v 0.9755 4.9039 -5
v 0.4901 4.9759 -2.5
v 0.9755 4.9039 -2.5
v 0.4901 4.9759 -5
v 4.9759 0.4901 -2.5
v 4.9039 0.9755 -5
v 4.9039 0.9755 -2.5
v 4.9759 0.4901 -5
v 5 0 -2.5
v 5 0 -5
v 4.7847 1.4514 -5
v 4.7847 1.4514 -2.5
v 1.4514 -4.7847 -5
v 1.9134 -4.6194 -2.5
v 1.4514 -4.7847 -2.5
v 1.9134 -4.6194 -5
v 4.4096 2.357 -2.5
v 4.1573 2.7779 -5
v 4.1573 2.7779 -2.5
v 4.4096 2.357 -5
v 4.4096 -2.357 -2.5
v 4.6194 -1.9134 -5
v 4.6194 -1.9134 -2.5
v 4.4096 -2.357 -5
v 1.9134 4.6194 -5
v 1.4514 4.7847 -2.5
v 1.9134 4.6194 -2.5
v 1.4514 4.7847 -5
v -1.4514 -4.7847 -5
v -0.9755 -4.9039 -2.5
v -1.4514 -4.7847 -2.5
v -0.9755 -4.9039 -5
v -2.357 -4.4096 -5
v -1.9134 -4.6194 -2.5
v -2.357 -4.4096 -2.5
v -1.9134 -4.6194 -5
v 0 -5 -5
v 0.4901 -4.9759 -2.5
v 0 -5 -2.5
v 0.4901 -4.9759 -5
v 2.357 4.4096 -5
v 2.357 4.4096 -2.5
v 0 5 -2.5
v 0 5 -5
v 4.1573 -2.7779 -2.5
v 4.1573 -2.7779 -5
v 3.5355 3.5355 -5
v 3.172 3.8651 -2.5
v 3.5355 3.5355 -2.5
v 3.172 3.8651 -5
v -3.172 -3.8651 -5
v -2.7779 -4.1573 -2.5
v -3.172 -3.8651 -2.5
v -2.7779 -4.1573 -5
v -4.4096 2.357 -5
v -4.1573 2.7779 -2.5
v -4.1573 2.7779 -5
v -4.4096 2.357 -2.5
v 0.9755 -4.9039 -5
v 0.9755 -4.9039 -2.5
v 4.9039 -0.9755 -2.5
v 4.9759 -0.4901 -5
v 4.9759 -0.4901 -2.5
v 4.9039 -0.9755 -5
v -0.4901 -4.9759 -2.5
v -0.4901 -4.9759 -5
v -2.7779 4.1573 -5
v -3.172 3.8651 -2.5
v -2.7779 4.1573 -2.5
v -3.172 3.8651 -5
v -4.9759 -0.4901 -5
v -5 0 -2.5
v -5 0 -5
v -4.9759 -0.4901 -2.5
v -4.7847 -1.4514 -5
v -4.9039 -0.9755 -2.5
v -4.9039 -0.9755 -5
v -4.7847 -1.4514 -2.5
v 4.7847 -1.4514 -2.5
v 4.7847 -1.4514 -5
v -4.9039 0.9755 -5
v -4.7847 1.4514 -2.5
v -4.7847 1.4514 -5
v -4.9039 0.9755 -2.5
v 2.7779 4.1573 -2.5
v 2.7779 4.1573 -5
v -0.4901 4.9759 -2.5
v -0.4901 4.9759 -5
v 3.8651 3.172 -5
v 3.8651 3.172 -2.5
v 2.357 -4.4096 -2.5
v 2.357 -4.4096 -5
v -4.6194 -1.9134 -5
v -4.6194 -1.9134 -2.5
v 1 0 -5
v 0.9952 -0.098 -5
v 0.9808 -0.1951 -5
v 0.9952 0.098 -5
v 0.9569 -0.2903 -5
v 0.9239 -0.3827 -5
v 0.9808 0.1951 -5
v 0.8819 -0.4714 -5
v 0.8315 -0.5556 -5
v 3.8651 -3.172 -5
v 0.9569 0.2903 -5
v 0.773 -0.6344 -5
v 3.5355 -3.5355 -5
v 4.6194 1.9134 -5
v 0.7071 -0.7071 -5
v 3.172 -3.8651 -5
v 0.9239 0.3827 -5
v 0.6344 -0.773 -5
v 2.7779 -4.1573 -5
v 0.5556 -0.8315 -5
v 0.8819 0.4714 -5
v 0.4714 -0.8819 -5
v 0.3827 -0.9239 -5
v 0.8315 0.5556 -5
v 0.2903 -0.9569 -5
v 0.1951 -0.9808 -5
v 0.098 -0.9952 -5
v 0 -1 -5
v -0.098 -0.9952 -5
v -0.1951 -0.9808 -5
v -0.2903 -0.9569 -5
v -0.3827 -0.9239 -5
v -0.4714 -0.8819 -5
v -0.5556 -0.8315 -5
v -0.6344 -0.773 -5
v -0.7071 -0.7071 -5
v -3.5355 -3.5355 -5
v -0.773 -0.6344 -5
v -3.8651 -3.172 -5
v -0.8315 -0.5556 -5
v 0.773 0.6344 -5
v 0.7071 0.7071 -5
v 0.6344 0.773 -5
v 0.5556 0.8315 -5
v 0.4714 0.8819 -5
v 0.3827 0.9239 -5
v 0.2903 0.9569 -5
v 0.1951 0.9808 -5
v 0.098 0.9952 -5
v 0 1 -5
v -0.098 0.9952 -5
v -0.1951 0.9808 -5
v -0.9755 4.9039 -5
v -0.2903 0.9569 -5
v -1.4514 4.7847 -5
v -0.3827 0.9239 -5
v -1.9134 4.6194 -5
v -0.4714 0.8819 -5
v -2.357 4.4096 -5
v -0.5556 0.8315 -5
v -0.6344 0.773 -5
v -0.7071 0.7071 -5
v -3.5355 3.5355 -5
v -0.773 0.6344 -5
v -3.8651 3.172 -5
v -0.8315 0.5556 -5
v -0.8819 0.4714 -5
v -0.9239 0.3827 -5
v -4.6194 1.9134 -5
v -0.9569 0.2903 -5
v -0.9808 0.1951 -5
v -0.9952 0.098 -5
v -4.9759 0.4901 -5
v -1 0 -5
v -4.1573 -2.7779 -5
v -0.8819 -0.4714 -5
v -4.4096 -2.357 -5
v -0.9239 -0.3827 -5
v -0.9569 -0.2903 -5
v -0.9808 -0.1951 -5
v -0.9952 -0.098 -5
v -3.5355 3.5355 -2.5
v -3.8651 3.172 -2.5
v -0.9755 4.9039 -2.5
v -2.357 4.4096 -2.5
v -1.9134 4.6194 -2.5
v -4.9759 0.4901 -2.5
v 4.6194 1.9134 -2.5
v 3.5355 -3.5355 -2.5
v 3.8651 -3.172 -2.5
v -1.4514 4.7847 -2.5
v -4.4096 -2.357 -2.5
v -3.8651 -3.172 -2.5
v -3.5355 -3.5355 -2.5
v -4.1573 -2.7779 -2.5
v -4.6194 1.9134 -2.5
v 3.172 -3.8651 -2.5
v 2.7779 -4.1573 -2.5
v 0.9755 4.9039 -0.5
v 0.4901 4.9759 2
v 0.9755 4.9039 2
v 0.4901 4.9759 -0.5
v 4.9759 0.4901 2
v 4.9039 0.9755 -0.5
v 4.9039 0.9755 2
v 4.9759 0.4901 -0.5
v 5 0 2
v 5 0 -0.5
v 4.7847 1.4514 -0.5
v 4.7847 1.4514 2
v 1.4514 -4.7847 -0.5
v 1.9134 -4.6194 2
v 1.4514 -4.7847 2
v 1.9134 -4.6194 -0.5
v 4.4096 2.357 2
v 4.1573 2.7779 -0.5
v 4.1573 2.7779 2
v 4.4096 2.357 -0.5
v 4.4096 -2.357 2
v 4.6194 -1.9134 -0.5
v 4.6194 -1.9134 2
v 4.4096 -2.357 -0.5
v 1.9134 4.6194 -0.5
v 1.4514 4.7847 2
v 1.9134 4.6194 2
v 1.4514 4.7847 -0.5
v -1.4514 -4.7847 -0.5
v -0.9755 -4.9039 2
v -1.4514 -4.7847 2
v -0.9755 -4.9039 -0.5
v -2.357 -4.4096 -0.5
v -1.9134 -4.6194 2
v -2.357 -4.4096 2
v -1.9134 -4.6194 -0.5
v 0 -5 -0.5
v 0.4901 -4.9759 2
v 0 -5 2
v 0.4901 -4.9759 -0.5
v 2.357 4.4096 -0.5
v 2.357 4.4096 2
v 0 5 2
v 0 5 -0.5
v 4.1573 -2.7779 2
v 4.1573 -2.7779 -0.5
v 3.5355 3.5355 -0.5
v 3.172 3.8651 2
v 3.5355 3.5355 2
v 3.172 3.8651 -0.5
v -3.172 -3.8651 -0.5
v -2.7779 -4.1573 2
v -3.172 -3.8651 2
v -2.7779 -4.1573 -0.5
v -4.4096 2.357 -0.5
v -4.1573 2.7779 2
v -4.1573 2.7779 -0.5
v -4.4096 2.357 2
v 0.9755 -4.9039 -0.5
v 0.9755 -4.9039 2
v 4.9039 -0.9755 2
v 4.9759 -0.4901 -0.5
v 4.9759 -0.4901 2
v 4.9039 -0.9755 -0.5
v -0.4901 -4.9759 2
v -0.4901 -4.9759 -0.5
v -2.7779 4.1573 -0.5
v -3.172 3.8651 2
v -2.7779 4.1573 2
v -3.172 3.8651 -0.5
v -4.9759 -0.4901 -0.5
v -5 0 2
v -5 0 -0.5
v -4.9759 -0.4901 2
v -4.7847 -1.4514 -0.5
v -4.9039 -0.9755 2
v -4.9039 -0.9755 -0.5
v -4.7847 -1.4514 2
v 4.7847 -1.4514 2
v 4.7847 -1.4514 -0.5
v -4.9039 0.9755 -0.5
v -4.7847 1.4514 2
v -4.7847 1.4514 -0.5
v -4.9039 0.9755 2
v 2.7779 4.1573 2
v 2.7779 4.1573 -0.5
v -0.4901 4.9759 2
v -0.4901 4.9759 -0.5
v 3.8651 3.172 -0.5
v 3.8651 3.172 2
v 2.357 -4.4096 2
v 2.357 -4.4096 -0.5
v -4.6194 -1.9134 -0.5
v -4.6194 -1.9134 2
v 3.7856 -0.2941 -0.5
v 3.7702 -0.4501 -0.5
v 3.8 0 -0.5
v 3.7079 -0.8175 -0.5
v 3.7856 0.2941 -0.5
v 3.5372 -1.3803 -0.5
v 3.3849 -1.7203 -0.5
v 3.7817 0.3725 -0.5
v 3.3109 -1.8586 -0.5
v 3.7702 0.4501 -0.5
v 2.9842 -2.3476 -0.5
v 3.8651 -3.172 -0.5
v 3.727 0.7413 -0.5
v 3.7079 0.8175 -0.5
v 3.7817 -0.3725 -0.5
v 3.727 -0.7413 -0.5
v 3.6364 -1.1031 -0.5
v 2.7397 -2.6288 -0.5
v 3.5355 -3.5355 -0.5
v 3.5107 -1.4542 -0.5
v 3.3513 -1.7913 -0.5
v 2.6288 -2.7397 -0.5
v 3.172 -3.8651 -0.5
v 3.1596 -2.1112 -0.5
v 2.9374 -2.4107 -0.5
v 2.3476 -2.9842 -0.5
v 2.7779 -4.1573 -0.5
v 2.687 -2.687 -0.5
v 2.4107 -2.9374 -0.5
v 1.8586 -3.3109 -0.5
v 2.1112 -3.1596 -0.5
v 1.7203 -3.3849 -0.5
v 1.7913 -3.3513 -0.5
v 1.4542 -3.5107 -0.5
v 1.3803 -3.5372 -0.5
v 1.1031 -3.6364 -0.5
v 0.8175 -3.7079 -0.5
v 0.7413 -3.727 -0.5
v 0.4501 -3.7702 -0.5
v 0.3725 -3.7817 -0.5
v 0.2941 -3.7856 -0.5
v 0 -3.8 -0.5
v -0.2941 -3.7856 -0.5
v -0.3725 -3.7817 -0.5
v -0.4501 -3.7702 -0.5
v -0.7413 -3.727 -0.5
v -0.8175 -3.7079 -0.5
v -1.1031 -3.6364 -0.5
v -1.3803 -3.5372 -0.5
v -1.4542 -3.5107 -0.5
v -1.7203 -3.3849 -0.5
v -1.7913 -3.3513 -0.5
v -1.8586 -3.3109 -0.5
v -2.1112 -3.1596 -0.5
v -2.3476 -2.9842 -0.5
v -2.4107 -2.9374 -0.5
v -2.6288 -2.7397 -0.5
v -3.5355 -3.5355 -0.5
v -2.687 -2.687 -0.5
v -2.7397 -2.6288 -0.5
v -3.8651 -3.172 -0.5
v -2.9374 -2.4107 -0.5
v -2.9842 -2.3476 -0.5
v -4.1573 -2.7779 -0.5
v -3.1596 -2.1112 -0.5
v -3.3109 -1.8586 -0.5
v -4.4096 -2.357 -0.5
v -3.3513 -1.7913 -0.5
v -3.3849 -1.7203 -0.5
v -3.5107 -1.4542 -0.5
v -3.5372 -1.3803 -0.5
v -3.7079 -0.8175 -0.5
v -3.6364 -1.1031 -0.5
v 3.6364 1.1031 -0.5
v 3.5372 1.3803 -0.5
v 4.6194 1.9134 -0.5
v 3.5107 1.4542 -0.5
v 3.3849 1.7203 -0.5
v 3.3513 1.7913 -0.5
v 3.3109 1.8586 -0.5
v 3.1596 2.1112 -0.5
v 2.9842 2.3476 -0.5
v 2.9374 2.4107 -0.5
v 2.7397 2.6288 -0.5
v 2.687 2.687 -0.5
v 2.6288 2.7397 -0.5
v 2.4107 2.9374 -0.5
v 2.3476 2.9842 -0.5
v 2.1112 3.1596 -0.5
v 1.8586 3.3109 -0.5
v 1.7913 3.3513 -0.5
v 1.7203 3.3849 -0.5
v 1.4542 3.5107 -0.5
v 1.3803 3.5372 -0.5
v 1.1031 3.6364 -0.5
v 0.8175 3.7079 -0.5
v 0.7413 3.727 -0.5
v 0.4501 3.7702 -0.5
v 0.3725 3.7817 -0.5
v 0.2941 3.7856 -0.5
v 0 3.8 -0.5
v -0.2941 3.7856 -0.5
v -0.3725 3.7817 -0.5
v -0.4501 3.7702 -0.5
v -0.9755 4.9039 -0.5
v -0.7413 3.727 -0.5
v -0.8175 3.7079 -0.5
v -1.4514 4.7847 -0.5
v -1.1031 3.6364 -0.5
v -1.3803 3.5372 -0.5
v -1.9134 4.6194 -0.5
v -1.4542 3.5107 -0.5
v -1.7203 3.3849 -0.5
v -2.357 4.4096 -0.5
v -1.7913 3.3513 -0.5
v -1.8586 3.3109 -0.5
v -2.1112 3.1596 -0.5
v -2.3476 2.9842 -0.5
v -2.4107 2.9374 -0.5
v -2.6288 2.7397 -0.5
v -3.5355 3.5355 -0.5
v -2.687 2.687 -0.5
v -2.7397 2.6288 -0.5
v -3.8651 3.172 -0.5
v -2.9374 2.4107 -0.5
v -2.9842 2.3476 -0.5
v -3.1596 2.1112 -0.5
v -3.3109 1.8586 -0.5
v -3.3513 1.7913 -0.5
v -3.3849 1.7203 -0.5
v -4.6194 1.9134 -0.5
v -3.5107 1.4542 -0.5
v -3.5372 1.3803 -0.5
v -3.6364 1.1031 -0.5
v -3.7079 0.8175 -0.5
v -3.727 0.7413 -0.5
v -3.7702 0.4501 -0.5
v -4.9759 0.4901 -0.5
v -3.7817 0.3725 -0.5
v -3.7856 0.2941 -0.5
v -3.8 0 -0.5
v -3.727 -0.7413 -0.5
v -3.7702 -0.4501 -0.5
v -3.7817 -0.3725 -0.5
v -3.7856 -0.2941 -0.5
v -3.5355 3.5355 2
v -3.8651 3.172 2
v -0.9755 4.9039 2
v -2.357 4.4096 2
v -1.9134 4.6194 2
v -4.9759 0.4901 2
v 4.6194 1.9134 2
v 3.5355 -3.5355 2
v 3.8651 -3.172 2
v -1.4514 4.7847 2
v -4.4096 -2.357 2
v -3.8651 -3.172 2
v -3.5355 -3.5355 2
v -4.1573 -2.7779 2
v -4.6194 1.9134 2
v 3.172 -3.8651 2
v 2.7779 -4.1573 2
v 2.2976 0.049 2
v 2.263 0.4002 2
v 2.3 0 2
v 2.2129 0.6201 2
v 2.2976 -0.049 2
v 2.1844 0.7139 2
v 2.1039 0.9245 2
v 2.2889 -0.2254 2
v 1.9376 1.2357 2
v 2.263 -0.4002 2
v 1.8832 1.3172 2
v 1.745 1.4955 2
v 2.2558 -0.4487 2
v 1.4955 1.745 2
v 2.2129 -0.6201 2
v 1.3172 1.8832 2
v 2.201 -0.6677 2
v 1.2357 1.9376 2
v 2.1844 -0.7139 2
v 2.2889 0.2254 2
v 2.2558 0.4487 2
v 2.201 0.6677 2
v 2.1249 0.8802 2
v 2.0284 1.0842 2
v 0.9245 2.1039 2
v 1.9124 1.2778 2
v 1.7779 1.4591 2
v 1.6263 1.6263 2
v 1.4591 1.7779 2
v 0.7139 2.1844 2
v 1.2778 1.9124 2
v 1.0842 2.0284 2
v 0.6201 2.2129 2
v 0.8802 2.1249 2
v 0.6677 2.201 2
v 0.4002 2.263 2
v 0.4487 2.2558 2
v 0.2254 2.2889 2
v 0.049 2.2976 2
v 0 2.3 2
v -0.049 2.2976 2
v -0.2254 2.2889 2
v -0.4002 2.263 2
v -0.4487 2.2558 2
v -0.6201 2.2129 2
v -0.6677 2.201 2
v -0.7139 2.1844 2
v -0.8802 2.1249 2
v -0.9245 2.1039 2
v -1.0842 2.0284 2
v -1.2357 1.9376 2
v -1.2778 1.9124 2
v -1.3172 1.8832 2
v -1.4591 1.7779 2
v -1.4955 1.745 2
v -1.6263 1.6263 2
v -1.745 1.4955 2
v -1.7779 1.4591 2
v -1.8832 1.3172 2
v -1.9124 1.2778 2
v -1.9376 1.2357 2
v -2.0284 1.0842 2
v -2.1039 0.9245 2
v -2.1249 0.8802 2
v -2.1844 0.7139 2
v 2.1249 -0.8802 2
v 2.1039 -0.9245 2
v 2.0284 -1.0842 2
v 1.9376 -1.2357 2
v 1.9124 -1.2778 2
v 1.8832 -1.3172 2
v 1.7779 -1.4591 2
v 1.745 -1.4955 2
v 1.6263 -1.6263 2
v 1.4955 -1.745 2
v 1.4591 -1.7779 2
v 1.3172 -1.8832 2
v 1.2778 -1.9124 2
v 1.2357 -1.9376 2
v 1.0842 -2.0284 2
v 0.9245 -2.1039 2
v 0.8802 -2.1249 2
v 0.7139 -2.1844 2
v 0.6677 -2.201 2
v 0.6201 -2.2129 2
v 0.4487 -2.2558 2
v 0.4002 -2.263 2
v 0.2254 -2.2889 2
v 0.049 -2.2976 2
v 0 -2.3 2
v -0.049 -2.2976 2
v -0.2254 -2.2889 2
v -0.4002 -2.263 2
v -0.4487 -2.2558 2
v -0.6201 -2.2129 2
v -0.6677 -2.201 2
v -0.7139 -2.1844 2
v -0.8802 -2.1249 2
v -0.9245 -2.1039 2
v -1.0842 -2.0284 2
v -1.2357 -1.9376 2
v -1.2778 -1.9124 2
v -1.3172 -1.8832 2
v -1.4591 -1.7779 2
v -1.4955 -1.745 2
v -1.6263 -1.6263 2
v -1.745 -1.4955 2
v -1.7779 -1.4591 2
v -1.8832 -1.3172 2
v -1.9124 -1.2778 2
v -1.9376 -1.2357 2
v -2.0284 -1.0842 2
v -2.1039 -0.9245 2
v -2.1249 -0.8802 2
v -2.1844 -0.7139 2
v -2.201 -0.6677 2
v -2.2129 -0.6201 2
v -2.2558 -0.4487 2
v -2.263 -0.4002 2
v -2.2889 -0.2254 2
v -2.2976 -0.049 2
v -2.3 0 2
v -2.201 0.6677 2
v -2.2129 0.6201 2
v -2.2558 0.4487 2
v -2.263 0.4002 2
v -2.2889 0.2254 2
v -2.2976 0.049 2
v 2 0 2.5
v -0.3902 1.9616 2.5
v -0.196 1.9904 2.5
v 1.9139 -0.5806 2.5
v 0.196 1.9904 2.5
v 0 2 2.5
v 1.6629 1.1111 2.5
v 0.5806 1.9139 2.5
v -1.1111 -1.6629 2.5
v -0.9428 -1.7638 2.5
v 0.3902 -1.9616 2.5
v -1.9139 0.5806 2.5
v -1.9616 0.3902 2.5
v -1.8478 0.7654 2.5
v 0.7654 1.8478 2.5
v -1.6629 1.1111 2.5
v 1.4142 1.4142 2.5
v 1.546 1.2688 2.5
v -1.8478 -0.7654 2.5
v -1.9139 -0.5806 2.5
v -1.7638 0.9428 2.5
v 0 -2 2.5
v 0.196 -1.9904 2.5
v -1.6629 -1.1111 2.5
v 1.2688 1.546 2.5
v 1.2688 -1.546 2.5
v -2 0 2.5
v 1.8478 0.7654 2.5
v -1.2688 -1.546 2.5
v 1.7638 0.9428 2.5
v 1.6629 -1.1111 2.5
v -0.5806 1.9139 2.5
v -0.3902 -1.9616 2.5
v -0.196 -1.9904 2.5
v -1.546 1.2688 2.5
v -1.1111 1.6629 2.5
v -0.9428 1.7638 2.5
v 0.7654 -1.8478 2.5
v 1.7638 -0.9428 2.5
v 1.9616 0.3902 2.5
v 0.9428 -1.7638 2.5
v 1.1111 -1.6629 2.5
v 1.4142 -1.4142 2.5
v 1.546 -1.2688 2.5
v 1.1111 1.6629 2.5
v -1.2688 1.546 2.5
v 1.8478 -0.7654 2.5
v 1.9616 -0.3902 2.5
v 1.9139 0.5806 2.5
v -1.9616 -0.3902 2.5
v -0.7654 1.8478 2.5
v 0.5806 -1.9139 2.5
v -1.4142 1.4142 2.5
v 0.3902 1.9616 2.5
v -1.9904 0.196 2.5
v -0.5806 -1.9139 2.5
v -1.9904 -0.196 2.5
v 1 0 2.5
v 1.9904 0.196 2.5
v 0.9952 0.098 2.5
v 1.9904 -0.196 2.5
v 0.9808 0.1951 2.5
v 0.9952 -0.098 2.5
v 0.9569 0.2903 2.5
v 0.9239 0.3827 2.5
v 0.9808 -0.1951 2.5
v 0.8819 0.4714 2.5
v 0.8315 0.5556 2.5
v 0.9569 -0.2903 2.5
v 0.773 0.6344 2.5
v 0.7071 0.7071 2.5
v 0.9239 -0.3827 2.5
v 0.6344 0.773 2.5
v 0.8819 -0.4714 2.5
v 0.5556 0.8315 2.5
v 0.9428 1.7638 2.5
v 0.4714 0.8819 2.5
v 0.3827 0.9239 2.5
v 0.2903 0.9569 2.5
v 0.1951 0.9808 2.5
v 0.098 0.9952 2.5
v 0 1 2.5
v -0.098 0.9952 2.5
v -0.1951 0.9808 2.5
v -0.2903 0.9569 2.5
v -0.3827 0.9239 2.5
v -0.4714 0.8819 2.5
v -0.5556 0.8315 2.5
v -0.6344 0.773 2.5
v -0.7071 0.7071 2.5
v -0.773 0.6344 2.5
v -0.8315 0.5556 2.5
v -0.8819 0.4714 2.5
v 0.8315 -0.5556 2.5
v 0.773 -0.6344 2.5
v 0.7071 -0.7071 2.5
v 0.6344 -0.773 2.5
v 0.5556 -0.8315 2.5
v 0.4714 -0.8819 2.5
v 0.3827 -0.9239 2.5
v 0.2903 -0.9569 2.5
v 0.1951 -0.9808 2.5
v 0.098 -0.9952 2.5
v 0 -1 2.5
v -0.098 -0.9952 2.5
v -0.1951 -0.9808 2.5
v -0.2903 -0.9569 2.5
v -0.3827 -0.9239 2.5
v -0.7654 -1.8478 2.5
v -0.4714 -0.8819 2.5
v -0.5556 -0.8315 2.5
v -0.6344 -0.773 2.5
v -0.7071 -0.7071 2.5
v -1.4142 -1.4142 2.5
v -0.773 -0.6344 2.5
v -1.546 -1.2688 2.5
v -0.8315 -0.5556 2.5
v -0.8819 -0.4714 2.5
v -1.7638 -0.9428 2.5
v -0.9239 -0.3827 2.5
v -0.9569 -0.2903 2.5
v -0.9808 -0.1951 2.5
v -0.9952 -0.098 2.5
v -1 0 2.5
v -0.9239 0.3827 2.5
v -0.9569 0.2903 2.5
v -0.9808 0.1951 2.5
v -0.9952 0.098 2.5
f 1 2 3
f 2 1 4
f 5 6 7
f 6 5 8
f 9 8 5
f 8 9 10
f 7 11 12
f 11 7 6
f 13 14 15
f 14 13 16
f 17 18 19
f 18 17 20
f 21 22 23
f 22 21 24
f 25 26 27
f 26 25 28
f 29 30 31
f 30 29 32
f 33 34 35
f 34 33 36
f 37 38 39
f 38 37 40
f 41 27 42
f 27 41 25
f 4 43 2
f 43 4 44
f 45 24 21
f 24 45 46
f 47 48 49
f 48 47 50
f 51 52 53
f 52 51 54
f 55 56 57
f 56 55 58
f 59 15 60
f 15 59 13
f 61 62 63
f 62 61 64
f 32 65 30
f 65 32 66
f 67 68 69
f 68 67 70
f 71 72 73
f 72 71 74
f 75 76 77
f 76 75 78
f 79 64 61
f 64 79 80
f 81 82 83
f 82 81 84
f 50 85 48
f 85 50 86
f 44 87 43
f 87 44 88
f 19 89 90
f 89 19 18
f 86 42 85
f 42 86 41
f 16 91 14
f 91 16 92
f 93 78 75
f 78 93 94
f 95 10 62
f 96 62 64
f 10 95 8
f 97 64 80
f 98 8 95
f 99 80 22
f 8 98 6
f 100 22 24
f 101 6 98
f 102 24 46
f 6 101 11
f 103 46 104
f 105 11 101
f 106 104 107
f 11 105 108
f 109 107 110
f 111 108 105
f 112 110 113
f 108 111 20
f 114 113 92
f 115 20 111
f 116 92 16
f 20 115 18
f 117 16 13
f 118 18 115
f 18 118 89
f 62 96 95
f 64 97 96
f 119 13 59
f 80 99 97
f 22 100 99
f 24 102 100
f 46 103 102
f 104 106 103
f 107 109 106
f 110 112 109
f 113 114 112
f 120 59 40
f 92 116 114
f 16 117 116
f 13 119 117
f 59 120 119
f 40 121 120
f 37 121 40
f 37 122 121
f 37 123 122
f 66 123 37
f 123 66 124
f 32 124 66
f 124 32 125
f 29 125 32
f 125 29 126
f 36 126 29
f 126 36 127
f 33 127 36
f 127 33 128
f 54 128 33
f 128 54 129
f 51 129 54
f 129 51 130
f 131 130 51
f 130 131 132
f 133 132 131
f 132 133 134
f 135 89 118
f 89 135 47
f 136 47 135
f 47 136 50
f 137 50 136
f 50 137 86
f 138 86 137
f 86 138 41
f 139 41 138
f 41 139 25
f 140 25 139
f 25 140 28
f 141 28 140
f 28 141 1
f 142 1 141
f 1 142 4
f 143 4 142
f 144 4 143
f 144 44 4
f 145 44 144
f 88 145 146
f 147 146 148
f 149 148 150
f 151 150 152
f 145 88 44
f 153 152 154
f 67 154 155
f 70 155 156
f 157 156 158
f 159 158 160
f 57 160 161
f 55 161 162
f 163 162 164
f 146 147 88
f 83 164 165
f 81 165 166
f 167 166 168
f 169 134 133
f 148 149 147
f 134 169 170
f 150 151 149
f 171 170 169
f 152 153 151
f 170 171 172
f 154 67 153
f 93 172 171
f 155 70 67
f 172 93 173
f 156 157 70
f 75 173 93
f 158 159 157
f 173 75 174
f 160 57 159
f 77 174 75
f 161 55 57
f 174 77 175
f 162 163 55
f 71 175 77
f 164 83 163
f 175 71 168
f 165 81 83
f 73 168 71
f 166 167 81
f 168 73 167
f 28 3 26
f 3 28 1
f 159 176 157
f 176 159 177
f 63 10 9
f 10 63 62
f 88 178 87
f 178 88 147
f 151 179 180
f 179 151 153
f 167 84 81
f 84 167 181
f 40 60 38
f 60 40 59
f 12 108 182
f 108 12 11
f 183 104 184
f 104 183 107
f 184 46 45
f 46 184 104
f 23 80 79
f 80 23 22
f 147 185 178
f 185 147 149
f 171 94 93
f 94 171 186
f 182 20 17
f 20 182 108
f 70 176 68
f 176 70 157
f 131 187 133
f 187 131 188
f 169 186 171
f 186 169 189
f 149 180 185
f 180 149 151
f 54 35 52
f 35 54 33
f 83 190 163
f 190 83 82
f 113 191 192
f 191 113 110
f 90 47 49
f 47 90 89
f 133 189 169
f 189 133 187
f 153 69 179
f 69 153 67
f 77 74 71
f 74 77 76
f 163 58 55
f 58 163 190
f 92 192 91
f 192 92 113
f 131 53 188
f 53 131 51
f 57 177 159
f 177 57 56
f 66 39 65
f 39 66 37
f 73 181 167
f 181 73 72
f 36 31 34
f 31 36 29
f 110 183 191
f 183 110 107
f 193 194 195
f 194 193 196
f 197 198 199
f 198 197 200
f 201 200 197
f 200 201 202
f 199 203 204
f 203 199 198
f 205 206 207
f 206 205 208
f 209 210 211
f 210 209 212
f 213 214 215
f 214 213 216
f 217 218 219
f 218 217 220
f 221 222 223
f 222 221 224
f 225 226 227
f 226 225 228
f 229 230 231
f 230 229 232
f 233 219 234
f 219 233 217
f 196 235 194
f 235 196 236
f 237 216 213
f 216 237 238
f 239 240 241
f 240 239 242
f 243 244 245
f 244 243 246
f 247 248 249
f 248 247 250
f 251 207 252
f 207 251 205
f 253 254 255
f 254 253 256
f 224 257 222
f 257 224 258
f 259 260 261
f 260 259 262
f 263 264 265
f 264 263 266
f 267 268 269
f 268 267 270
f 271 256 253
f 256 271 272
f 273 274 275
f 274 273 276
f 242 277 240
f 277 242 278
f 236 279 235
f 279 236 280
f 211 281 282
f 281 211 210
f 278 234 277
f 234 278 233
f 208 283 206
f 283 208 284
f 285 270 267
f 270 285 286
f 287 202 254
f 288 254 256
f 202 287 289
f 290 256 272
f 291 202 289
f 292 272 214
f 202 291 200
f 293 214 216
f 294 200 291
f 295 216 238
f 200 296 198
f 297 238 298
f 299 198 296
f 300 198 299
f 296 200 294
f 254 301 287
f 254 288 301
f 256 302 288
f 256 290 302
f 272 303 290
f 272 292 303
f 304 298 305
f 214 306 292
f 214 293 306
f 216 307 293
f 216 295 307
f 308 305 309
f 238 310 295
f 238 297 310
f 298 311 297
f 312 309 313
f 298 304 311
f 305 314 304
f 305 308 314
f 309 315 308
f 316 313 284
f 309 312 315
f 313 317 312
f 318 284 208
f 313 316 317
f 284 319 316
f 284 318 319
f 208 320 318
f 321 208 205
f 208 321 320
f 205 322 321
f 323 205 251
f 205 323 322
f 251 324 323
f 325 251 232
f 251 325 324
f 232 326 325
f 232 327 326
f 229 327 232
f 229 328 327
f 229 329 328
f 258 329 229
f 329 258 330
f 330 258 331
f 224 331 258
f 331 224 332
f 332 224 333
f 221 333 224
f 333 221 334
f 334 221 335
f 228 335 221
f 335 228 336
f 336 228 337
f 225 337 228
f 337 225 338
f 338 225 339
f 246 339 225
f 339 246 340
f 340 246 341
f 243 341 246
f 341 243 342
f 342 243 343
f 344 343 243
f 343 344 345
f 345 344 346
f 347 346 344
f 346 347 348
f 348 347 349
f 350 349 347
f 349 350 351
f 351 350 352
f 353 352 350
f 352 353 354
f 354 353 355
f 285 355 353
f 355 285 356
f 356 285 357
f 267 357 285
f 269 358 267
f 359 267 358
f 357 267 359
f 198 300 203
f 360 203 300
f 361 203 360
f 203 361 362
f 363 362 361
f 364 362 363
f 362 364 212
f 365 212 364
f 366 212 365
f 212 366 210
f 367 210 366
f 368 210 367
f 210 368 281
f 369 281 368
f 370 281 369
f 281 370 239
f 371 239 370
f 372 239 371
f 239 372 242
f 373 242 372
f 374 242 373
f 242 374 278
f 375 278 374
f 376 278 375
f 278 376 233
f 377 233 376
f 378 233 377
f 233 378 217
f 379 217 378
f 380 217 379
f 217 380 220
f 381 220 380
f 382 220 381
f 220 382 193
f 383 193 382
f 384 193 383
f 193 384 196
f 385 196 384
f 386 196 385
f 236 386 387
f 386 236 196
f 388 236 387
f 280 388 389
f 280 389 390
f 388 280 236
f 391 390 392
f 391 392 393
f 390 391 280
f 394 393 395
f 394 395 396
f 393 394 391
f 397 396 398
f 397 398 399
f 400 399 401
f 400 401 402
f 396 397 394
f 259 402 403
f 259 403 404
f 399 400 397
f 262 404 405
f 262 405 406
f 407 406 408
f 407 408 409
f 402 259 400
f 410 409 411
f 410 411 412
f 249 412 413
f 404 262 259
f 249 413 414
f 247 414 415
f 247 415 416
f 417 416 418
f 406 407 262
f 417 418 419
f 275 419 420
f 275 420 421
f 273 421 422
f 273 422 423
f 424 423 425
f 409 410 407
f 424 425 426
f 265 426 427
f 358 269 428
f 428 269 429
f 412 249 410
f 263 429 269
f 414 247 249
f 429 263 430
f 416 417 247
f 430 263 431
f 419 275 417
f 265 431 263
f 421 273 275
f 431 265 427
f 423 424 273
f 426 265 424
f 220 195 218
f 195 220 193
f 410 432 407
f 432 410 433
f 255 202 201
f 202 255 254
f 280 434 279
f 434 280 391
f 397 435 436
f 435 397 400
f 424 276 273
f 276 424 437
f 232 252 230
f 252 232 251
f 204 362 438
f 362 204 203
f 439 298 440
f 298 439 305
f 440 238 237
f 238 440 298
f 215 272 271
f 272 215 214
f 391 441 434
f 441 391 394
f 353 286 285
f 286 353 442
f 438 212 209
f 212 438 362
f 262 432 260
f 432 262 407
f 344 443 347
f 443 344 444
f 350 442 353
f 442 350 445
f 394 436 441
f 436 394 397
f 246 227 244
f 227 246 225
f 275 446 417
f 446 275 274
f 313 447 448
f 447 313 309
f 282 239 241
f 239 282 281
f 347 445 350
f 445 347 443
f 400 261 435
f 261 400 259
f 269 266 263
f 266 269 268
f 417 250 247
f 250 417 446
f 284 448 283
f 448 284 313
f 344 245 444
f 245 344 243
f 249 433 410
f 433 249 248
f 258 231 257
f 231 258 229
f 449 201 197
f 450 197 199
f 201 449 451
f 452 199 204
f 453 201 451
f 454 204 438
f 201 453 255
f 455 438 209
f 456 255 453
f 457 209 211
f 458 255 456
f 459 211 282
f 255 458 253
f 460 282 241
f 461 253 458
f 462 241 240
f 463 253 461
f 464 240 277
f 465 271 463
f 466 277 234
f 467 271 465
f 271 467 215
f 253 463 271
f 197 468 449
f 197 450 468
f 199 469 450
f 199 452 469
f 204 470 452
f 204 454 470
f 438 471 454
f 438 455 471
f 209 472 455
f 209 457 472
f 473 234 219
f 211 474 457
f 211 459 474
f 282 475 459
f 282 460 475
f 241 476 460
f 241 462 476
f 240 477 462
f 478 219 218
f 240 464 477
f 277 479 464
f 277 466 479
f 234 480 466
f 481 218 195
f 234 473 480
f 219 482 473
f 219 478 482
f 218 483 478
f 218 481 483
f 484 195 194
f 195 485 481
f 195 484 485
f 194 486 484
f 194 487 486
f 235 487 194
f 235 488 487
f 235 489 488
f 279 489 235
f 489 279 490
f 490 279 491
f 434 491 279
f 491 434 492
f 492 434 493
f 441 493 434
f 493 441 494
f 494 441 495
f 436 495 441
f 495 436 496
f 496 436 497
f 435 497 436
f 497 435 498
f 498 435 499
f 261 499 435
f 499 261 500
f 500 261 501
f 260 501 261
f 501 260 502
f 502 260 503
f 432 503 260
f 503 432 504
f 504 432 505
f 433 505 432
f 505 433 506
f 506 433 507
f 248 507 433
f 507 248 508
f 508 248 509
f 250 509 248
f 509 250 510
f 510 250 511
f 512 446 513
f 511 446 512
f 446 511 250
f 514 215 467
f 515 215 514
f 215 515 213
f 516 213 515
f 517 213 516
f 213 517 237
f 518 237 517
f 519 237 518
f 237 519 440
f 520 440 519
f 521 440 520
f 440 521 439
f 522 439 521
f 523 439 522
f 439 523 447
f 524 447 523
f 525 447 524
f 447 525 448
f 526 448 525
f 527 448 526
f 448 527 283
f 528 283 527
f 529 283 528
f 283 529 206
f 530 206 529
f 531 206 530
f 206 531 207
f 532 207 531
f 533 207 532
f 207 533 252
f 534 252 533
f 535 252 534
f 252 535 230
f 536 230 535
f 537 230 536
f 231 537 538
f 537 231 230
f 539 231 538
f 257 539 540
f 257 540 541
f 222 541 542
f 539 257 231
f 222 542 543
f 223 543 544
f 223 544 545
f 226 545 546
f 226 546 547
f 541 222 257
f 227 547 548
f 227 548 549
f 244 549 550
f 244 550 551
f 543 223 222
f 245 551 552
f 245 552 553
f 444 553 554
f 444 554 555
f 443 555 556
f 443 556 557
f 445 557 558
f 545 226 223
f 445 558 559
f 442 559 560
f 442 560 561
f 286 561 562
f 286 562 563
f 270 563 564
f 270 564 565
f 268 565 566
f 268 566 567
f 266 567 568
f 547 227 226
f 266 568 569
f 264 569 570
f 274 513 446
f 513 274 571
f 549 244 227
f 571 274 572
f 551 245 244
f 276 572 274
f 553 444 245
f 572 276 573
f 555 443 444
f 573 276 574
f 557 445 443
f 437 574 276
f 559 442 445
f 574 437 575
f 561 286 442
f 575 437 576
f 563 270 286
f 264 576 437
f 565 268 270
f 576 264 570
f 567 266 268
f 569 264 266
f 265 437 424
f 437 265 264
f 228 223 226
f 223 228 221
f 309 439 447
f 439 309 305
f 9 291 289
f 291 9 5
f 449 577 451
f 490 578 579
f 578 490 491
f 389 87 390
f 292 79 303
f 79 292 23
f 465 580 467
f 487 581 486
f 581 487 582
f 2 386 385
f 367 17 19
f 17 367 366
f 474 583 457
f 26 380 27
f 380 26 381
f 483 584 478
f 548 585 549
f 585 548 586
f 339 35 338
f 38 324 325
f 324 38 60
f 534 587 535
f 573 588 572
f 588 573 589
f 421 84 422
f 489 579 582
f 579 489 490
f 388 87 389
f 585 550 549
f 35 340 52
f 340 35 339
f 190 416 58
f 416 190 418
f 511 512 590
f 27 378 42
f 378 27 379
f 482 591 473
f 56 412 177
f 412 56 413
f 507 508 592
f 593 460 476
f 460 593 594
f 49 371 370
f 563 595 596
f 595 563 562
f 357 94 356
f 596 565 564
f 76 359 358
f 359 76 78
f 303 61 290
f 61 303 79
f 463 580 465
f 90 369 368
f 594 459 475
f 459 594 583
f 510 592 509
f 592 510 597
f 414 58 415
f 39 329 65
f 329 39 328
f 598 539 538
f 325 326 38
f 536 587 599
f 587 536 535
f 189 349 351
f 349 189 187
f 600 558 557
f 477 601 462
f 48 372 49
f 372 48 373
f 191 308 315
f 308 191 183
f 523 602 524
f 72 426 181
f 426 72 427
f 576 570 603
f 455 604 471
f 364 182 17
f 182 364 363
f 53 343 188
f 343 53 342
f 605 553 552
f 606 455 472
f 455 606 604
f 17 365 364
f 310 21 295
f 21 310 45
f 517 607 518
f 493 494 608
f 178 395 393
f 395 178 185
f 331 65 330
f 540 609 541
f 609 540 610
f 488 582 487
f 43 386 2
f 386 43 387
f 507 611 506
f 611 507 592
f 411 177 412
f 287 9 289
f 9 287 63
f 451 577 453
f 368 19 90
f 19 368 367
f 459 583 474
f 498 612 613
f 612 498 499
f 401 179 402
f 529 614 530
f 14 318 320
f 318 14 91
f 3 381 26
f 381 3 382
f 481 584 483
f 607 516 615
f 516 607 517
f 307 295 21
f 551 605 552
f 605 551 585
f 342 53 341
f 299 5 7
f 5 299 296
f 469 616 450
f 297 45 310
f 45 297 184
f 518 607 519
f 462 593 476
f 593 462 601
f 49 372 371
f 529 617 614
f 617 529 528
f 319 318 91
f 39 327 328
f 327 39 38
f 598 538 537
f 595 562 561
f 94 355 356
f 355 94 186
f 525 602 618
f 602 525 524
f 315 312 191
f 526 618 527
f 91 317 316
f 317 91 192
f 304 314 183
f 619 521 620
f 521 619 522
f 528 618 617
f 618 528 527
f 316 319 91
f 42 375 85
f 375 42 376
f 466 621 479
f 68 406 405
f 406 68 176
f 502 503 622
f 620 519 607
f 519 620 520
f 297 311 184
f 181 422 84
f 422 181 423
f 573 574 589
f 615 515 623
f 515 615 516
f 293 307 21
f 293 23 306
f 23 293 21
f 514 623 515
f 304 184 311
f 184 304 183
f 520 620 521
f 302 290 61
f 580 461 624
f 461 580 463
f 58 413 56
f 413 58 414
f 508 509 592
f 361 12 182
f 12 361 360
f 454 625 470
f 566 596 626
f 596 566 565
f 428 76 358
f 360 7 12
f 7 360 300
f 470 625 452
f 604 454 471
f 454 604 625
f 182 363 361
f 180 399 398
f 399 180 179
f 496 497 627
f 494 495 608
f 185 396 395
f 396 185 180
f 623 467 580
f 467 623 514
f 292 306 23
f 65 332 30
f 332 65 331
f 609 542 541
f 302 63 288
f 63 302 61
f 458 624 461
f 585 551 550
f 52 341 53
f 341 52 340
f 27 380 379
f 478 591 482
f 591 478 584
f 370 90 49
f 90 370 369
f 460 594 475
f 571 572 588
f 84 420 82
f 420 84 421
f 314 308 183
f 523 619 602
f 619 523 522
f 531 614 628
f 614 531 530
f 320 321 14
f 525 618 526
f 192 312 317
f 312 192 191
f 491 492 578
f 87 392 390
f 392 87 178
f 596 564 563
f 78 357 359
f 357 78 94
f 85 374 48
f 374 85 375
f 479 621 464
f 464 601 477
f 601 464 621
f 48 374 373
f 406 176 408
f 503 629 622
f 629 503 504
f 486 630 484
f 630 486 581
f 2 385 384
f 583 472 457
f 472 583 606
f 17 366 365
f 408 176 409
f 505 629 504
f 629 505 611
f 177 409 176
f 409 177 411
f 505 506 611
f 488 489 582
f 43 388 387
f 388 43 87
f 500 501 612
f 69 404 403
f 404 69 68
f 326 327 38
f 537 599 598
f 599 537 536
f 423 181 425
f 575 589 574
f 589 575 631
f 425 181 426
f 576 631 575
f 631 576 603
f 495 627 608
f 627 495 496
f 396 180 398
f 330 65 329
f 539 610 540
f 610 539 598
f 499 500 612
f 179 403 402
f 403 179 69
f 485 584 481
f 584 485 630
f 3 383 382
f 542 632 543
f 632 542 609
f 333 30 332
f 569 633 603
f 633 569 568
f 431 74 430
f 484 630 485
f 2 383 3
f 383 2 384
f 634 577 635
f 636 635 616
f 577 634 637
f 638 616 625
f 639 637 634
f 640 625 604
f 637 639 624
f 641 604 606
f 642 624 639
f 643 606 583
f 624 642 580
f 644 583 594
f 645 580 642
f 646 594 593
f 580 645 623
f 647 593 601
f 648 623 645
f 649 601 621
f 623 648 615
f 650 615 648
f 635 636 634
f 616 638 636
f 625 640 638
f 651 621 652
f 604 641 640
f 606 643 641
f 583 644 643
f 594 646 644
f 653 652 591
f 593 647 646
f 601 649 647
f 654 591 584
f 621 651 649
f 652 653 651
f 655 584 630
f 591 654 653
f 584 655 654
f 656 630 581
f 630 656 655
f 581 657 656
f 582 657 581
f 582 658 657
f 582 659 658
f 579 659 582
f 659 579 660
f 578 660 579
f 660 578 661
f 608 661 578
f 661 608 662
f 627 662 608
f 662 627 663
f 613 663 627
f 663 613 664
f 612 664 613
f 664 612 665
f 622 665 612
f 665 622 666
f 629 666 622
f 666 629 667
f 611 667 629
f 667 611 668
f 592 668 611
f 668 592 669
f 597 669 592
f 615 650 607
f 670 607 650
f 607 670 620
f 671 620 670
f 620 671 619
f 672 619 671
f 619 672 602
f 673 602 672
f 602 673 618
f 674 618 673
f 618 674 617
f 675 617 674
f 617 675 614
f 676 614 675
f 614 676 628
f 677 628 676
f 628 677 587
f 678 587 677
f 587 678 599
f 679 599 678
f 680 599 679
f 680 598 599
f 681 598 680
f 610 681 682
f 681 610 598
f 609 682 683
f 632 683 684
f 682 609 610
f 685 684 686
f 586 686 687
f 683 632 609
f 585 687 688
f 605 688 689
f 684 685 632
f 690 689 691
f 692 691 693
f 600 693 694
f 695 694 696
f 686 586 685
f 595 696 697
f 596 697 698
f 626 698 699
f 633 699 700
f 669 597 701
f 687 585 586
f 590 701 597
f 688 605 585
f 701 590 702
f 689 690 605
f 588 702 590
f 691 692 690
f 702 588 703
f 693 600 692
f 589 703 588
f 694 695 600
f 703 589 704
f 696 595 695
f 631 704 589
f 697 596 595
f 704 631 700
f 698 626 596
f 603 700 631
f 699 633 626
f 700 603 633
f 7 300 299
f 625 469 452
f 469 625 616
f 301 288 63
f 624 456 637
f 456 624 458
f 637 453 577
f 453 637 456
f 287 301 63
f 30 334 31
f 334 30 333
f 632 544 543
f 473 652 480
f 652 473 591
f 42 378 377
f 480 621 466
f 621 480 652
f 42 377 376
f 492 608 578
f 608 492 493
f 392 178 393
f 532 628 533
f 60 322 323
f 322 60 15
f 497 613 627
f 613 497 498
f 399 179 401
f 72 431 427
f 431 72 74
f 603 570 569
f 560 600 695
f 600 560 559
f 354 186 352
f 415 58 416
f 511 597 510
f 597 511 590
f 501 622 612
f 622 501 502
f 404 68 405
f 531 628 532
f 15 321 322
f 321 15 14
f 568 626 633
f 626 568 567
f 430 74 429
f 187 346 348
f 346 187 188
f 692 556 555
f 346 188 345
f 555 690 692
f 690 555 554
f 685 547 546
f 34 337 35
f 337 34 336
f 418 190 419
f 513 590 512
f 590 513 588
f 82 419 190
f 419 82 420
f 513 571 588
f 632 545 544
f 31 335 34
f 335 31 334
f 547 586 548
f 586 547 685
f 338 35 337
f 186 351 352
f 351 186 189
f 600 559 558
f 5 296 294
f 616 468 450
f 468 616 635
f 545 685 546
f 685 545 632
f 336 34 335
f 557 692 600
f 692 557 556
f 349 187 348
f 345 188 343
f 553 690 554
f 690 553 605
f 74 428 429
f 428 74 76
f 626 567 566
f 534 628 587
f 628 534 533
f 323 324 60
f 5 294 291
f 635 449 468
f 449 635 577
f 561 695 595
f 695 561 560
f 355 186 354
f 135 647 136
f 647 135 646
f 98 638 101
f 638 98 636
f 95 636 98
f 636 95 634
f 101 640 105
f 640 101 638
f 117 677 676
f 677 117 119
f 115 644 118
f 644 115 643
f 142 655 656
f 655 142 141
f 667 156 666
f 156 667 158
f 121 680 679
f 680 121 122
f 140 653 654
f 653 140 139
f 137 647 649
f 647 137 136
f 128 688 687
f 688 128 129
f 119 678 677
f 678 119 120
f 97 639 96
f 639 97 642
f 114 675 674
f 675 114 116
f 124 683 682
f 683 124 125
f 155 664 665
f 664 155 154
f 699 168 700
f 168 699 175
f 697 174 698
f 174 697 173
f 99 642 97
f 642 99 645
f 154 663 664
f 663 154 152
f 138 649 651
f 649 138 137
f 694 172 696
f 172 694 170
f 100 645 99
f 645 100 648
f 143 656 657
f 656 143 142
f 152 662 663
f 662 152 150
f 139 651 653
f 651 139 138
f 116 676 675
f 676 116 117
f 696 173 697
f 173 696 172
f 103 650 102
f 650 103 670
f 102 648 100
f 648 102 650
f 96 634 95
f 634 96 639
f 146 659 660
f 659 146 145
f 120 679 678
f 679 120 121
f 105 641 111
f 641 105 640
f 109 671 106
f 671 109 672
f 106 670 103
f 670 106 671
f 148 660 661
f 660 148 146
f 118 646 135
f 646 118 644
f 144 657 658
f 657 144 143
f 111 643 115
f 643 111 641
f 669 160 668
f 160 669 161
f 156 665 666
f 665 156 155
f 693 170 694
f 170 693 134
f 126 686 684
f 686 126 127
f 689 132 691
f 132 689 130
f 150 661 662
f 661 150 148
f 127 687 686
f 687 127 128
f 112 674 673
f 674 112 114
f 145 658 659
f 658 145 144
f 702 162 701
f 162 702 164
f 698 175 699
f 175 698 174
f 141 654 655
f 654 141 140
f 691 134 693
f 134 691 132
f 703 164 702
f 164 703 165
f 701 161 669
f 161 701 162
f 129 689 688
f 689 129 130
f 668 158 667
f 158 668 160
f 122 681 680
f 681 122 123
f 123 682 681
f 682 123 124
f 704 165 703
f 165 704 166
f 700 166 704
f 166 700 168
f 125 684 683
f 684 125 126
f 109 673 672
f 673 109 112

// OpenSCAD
module spool() {
    difference() {
        union() {
            // Outer flanges
            cylinder(h=2.5, r=5, $fn=64);
            translate([0, 0, 4.5])
                cylinder(h=2.5, r=5, $fn=64);
            
            // Central double-conical waist
            translate([0, 0, 2.5])
                cylinder(h=5, r1=5, r2=2, $fn=64);
        }
        // Central through-bore
        translate([0, 0, -1])
            cylinder(h=12, r=1, $fn=64);
    }
}

translate([0, 0, -5])
    spool();
